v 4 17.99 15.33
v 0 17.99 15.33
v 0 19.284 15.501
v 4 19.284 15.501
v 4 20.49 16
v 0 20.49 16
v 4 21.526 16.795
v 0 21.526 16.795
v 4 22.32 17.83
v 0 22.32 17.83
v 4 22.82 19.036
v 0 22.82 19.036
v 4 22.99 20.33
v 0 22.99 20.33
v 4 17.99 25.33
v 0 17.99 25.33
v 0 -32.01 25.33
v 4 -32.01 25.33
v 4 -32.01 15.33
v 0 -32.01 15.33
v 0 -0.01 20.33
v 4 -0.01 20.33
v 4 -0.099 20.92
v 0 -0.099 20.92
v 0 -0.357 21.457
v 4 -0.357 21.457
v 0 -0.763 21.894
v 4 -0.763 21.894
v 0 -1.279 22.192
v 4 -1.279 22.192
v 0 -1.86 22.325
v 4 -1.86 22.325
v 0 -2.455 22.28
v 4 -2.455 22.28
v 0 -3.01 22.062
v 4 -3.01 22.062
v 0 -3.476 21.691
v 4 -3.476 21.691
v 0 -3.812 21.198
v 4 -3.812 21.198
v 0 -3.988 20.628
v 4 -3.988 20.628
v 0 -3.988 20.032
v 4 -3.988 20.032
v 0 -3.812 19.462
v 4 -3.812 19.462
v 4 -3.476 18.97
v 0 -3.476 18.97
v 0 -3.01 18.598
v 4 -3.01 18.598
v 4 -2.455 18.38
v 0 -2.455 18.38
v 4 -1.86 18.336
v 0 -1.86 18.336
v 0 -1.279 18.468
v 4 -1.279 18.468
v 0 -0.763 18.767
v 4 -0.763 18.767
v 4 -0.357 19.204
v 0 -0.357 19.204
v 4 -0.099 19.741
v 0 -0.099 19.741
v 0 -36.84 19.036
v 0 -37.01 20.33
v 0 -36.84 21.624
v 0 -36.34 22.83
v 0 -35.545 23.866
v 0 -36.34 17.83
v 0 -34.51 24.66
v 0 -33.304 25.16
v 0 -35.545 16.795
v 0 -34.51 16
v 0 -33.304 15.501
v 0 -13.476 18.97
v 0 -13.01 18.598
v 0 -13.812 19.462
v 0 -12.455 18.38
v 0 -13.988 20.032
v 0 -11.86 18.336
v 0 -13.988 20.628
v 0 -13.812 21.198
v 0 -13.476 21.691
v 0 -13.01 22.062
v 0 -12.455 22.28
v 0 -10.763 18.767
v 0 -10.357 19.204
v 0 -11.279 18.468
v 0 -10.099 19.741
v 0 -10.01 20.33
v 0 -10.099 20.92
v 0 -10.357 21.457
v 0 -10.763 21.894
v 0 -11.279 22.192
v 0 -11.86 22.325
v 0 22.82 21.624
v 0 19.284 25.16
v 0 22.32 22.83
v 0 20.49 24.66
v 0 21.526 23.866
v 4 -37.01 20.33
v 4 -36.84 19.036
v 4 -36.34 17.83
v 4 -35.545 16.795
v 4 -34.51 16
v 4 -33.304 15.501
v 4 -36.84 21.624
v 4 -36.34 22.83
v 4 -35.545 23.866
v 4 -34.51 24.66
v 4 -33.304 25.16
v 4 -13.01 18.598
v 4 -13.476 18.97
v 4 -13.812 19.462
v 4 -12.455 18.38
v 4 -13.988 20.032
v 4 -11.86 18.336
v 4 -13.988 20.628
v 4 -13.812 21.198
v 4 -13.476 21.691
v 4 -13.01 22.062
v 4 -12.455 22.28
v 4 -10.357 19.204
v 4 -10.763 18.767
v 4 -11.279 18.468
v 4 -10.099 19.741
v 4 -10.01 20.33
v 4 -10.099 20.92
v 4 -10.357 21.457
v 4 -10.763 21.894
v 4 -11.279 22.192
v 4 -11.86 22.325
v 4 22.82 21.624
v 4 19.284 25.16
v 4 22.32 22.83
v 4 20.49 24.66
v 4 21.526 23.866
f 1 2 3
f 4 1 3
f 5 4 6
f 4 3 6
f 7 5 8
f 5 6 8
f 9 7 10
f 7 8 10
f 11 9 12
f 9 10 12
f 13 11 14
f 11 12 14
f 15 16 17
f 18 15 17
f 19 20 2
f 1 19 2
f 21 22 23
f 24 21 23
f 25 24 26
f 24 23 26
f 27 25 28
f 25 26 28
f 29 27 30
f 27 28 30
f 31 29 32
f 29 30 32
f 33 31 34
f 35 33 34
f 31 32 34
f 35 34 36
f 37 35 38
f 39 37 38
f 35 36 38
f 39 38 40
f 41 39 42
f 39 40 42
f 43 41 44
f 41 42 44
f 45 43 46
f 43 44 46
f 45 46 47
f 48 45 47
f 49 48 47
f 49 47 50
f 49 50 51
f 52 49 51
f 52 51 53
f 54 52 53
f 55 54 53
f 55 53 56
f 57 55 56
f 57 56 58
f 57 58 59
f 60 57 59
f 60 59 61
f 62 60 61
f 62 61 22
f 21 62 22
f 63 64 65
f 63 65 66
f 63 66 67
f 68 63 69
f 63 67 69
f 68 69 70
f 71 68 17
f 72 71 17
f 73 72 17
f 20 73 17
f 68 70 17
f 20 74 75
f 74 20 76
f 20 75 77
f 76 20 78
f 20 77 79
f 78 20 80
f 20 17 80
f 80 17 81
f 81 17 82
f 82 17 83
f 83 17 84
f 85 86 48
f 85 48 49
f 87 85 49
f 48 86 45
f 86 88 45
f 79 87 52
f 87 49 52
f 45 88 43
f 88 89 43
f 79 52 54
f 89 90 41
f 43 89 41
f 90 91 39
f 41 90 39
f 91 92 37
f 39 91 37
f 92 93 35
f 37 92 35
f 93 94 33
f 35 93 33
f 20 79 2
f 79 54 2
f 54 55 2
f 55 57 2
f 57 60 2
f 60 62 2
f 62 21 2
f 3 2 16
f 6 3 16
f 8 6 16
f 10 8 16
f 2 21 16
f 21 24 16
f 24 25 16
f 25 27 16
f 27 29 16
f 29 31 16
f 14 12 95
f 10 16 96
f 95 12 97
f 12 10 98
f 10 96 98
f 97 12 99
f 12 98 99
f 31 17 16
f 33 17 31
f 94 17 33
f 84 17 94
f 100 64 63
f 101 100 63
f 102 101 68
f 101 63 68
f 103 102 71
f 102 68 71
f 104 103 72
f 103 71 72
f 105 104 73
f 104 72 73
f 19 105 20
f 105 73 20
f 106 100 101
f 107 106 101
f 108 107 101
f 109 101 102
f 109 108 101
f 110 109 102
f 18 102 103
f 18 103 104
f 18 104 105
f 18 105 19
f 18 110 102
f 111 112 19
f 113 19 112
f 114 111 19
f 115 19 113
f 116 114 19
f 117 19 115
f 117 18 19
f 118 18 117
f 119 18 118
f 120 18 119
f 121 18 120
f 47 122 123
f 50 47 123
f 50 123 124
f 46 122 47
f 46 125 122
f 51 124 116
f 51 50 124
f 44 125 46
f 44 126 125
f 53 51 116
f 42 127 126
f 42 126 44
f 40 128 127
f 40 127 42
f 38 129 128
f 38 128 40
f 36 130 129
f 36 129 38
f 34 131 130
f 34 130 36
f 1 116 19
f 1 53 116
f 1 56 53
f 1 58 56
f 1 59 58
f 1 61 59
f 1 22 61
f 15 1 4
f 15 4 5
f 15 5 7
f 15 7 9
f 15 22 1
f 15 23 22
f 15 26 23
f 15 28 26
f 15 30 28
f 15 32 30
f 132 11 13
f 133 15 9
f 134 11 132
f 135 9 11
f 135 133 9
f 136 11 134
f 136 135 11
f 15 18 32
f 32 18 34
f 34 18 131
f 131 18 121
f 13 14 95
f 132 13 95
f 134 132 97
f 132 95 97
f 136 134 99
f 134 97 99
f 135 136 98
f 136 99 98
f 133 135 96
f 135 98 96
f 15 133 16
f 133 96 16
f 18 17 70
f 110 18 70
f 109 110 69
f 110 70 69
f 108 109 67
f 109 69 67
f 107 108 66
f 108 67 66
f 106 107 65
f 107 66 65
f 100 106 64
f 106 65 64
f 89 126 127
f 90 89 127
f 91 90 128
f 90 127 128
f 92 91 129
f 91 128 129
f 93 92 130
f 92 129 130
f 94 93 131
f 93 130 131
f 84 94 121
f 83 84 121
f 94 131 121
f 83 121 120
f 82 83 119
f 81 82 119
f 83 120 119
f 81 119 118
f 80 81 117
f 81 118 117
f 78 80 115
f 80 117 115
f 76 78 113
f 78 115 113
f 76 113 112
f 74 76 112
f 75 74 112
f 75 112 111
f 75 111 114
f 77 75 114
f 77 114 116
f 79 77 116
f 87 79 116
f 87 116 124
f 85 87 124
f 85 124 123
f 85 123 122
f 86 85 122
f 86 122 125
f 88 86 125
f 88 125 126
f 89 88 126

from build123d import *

# Parameters (mm, degrees)
F1_DEPTH = 4
F2_R     = 2
F3_DEPTH = 25


with BuildPart() as f1:
    # F0 (on Right) → F1 (new body)
    with BuildSketch(Plane.YZ):
        with BuildLine():
            Line((17.990056, 25.330209), (-32.009944, 25.330209))
            ThreePointArc((-32.009944, 25.330209), (-35.545478, 23.865743), (-37.009944, 20.330209))
            ThreePointArc((-37.009944, 20.330209), (-35.545478, 16.794676), (-32.009944, 15.330209))
            Line((-32.009944, 15.330209), (17.990056, 15.330209))
            ThreePointArc((17.990056, 15.330209), (21.52559, 16.794676), (22.990056, 20.330209))
            ThreePointArc((22.990056, 20.330209), (21.52559, 23.865743), (17.990056, 25.330209))
        make_face()
    extrude(amount=F1_DEPTH)

    # F2 (on face) → F3 (cut)
    with BuildSketch(Plane.YZ.offset(4)):
        with Locations((-12.009944, 20.330209)):
            Circle(F2_R)
        with Locations((-2.009944, 20.330209)):
            Circle(F2_R)
    extrude(amount=-F3_DEPTH, mode=Mode.SUBTRACT)


solid = f1.part
